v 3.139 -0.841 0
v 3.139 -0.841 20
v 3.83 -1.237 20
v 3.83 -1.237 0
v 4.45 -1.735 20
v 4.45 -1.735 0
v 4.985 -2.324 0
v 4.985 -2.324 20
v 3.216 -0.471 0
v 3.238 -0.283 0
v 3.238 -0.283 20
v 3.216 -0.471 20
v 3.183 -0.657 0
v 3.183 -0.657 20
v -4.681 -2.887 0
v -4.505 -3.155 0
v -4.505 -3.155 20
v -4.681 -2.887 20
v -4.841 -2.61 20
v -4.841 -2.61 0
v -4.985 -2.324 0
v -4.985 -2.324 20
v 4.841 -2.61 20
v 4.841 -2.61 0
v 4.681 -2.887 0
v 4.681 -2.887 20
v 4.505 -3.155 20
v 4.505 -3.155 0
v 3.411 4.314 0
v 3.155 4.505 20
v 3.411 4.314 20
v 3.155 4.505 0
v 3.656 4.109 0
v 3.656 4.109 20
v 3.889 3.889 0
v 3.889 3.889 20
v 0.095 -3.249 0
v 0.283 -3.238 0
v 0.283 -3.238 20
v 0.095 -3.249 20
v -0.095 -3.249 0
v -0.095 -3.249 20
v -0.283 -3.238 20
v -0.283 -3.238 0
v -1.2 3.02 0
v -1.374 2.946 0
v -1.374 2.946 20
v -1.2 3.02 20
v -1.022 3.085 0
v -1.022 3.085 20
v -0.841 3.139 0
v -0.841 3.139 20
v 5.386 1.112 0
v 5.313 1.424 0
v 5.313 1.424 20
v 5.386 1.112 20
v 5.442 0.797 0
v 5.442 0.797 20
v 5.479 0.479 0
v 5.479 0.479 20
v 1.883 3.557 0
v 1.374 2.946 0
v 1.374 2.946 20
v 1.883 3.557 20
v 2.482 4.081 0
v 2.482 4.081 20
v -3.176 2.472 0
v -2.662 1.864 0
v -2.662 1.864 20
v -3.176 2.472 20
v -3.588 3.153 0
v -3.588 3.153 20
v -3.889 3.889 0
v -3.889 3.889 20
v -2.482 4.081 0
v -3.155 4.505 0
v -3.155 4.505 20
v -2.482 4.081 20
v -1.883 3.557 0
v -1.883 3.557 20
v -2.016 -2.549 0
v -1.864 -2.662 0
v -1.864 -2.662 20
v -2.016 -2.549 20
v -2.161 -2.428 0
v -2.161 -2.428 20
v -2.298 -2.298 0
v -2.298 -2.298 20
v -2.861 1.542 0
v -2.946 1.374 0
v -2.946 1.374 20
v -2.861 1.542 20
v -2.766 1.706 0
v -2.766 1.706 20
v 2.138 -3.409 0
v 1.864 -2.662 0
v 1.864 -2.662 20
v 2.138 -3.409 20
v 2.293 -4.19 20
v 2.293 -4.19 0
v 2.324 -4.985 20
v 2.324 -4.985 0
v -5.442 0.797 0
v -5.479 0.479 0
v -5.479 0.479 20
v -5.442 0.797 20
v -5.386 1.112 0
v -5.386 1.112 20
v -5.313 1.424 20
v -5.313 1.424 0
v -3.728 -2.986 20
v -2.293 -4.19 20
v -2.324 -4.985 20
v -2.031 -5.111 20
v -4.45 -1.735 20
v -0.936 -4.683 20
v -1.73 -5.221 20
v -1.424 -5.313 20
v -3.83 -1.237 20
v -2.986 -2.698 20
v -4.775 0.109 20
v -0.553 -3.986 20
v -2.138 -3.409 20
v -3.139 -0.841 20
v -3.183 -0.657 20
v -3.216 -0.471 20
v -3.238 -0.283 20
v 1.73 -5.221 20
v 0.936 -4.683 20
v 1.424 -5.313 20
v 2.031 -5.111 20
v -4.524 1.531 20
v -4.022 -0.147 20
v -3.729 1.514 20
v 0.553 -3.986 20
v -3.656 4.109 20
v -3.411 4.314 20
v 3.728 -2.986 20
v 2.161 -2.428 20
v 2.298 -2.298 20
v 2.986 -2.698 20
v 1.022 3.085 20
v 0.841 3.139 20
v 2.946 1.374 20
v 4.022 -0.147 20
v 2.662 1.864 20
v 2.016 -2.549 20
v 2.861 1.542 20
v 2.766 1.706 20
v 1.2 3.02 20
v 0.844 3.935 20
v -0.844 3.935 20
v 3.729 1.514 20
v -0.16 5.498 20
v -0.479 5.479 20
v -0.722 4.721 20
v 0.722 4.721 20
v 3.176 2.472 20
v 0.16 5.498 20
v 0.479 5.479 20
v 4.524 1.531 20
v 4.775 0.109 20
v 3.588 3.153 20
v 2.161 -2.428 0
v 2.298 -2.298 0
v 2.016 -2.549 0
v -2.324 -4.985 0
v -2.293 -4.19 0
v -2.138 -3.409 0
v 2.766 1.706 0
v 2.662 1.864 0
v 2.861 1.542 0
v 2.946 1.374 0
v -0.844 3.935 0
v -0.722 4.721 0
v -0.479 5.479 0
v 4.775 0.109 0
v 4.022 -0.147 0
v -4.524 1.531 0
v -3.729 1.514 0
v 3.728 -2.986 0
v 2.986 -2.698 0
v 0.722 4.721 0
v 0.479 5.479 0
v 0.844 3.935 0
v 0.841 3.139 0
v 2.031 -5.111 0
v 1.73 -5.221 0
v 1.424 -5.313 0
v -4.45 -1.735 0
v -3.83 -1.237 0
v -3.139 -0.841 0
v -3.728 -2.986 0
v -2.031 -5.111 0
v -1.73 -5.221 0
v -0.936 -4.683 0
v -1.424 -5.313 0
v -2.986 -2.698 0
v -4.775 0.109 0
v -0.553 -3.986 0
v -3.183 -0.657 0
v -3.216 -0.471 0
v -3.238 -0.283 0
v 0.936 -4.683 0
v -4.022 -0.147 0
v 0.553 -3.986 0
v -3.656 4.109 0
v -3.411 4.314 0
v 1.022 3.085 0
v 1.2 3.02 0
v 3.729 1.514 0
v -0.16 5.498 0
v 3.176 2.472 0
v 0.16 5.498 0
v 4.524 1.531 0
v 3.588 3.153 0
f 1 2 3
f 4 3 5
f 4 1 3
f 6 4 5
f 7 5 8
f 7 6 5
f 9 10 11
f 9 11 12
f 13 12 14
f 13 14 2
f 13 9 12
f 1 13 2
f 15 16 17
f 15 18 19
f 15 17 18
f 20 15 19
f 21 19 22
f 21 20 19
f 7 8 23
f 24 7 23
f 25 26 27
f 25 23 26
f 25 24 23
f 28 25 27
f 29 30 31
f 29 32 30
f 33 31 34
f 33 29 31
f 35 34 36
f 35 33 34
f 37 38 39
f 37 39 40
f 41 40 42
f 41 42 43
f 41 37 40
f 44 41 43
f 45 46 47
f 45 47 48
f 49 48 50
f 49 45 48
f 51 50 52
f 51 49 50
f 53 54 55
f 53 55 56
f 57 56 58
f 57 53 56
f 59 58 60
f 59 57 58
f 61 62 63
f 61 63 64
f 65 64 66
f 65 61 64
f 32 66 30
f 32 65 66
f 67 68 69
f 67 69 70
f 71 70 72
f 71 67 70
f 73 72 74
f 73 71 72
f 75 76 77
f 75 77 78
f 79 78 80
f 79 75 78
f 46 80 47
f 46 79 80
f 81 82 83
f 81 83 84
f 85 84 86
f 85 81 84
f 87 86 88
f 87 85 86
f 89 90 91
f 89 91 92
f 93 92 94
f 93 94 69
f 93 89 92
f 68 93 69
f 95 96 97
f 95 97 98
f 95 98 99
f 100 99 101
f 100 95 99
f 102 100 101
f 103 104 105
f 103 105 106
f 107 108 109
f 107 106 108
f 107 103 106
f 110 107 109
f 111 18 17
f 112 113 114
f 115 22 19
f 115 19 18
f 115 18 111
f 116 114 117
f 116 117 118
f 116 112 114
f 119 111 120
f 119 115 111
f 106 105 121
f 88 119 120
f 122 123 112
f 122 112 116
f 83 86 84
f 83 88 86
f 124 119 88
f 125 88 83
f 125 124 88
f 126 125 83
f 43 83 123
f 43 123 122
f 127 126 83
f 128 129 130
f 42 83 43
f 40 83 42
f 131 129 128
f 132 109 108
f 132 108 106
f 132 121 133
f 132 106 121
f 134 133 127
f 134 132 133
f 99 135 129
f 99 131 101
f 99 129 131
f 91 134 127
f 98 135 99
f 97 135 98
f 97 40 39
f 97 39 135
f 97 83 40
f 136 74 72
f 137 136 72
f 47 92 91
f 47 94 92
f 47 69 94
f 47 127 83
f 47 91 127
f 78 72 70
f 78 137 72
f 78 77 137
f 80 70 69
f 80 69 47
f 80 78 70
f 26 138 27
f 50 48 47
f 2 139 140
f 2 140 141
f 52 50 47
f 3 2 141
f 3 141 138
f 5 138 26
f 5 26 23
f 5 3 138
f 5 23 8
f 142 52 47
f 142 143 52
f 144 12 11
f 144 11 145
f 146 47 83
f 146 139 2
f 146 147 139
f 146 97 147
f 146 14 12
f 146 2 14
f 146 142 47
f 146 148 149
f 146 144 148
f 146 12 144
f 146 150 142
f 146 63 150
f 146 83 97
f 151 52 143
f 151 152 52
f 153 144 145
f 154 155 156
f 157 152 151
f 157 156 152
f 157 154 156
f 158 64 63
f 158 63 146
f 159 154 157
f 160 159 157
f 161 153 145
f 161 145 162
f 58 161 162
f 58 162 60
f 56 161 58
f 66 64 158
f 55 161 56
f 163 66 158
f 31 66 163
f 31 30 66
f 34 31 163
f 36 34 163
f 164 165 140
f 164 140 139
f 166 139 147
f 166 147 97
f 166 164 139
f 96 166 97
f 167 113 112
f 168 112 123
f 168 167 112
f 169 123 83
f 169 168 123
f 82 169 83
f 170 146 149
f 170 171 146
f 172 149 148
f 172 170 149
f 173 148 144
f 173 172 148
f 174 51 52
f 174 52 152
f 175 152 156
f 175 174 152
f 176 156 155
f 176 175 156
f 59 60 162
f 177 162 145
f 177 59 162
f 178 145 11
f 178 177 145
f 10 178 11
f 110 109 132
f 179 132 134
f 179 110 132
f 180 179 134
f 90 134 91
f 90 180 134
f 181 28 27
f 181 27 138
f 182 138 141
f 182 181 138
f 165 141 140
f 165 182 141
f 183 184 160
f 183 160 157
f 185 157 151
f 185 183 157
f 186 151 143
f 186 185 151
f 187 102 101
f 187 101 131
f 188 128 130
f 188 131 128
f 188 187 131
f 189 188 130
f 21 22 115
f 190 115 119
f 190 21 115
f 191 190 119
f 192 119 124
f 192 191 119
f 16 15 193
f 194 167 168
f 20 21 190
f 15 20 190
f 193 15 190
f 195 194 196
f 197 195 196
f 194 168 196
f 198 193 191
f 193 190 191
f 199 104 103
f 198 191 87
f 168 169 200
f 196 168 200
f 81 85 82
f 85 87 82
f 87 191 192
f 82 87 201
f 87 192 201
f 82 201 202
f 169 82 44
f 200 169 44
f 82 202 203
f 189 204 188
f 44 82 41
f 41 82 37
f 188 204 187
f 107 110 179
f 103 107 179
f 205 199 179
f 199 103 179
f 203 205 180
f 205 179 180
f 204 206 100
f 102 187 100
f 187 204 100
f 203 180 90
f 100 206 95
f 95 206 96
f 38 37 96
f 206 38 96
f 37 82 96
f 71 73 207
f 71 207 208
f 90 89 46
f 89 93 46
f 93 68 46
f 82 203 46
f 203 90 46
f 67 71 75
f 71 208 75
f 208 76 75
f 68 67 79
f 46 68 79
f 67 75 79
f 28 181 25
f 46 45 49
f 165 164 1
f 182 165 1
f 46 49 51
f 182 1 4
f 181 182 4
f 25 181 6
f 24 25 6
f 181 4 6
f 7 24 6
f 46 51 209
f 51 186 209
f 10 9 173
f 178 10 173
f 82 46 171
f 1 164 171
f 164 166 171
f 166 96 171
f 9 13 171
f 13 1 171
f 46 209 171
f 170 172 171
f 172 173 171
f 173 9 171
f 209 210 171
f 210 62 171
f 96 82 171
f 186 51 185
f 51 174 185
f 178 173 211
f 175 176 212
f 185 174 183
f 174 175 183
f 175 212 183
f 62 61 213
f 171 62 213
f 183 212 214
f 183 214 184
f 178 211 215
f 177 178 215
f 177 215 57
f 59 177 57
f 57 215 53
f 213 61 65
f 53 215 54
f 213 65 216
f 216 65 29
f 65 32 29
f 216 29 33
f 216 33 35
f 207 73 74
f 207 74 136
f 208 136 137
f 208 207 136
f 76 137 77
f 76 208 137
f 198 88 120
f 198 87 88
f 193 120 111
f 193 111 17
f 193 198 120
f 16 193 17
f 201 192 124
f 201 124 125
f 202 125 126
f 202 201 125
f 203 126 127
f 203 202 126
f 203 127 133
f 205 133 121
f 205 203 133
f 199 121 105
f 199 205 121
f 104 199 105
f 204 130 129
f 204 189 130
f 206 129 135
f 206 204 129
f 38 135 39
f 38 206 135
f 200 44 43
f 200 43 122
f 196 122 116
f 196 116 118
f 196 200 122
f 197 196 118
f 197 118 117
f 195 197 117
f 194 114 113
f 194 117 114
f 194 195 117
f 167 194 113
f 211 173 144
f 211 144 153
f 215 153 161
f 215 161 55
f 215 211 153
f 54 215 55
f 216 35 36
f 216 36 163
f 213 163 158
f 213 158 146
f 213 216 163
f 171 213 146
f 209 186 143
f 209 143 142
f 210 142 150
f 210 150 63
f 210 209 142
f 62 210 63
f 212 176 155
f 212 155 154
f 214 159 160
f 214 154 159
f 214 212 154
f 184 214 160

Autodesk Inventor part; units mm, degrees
sketch "Sketch1" plane through (0, 0, 0) normal (0, 0, 1) x (1, 0, 0)
  circle A0 centre (0, 0) radius 5.5
  dimension "d0" = 11
extrude "Extrusion1" add sketch "Sketch1" along normal blind 20
ref_plane "Work Plane2" through (0, 0, 10) normal (0, 0, 1) x (1, 0, 0)
sketch "Sketch2" plane through (0, 0, 0) normal (0, 0, -1) x (-1, 0, 0)
  circle A0 centre (0, 0) radius 5.5 projected
  circle A1 centre (0, 0) radius 4.5
  dimension "d3" = 9
surface extrude "ピッチ円直径" sketch "Sketch2" against normal through all shown no curves A1
ref_plane "Work Plane8" through (0, 0, 0) normal (0.9396926, 0.3420201, 0) x (0, 0, 1)
ref_plane "Work Plane9" through (0, 0, 0) normal (1, 0, 0) x (0, 1, 0)
spur gear teeth "平歯車" teeth 9 pitch diameter 9 tip diameter 11 root diameter 6.5 face width 20 start plane through (0, 0, 0) normal (0, 0, -1) x (-1, 0, 0)
sketch "スケッチ3" plane through (0, 0, 20) normal (0, 0, 1) x (1, 0, 0)
  arc A0 (-3.8891, 3.8891) -> (-2.6622, 1.8641) centre (0.9613, 5.4436) ccw projected
  arc A1 (-2.6622, 1.8641) -> (-2.9455, 1.3735) centre (0, 0) ccw projected
  arc A2 (-2.9455, 1.3735) -> (-5.3126, 1.4235) centre (-4.2337, -3.5543) ccw projected
  arc A3 (-5.3126, 1.4235) -> (-5.4791, 0.4794) centre (0, 0) ccw projected
  arc A4 (-5.4791, 0.4794) -> (-3.2376, -0.2833) centre (-2.7627, 4.7879) ccw projected
  arc A5 (-3.2376, -0.2833) -> (-3.1393, -0.8412) centre (0, 0) ccw projected
  arc A6 (-3.1393, -0.8412) -> (-4.9847, -2.3244) centre (-0.9585, -5.4441) ccw projected
  arc A7 (-4.9847, -2.3244) -> (-4.5053, -3.1547) centre (0, 0) ccw projected
  arc A8 (-4.5053, -3.1547) -> (-2.2981, -2.2981) centre (-5.194, 1.8919) ccw projected
  arc A9 (-2.2981, -2.2981) -> (-1.8641, -2.6622) centre (0, 0) ccw projected
  arc A10 (-1.8641, -2.6622) -> (-2.3244, -4.9847) centre (2.7651, -4.7865) ccw projected
  arc A11 (-2.3244, -4.9847) -> (-1.4235, -5.3126) centre (0, 0) ccw projected
  arc A12 (-1.4235, -5.3126) -> (-0.2833, -3.2376) centre (-5.1949, -1.8893) ccw projected
  arc A13 (-0.2833, -3.2376) -> (0.2833, -3.2376) centre (0, 0) ccw projected
  arc A14 (0.2833, -3.2376) -> (1.4235, -5.3126) centre (5.1949, -1.8893) ccw projected
  arc A15 (1.4235, -5.3126) -> (2.3244, -4.9847) centre (0, 0) ccw projected
  arc A16 (2.3244, -4.9847) -> (1.8641, -2.6622) centre (-2.7651, -4.7865) ccw projected
  arc A17 (1.8641, -2.6622) -> (2.2981, -2.2981) centre (0, 0) ccw projected
  arc A18 (2.2981, -2.2981) -> (4.5053, -3.1547) centre (5.194, 1.8919) ccw projected
  arc A19 (4.5053, -3.1547) -> (4.9847, -2.3244) centre (0, 0) ccw projected
  arc A20 (4.9847, -2.3244) -> (3.1393, -0.8412) centre (0.9585, -5.4441) ccw projected
  arc A21 (3.1393, -0.8412) -> (3.2376, -0.2833) centre (0, 0) ccw projected
  arc A22 (3.2376, -0.2833) -> (5.4791, 0.4794) centre (2.7627, 4.7879) ccw projected
  arc A23 (5.4791, 0.4794) -> (5.3126, 1.4235) centre (0, 0) ccw projected
  arc A24 (5.3126, 1.4235) -> (2.9455, 1.3735) centre (4.2337, -3.5543) ccw projected
  arc A25 (2.9455, 1.3735) -> (2.6622, 1.8641) centre (0, 0) ccw projected
  arc A26 (2.6622, 1.8641) -> (3.8891, 3.8891) centre (-0.9613, 5.4436) ccw projected
  arc A27 (3.8891, 3.8891) -> (3.1547, 4.5053) centre (0, 0) ccw projected
  arc A28 (3.1547, 4.5053) -> (1.3735, 2.9455) centre (5.5278, -0.0014) ccw projected
  arc A29 (1.3735, 2.9455) -> (0.8412, 3.1393) centre (0, 0) ccw projected
  arc A30 (0.8412, 3.1393) -> (0.4794, 5.4791) centre (-4.2354, 3.5521) ccw projected
  arc A31 (0.4794, 5.4791) -> (-0.4794, 5.4791) centre (0, 0) ccw projected
  arc A32 (-0.4794, 5.4791) -> (-0.8412, 3.1393) centre (4.2354, 3.5521) ccw projected
  arc A33 (-0.8412, 3.1393) -> (-1.3735, 2.9455) centre (0, 0) ccw projected
  arc A34 (-1.3735, 2.9455) -> (-3.1547, 4.5053) centre (-5.5278, -0.0014) ccw projected
  arc A35 (-3.1547, 4.5053) -> (-3.8891, 3.8891) centre (0, 0) ccw projected
equation "\"d0\" = da_da"
equation "\"d1\" = da_b"
equation "\"d3\" = da_dw"
equation "\"da_da\" = 11"
equation "\"da_b\" = 20"
equation "\"da_dw\" = 9"
properties part number "平歯車1" material "Steel"
